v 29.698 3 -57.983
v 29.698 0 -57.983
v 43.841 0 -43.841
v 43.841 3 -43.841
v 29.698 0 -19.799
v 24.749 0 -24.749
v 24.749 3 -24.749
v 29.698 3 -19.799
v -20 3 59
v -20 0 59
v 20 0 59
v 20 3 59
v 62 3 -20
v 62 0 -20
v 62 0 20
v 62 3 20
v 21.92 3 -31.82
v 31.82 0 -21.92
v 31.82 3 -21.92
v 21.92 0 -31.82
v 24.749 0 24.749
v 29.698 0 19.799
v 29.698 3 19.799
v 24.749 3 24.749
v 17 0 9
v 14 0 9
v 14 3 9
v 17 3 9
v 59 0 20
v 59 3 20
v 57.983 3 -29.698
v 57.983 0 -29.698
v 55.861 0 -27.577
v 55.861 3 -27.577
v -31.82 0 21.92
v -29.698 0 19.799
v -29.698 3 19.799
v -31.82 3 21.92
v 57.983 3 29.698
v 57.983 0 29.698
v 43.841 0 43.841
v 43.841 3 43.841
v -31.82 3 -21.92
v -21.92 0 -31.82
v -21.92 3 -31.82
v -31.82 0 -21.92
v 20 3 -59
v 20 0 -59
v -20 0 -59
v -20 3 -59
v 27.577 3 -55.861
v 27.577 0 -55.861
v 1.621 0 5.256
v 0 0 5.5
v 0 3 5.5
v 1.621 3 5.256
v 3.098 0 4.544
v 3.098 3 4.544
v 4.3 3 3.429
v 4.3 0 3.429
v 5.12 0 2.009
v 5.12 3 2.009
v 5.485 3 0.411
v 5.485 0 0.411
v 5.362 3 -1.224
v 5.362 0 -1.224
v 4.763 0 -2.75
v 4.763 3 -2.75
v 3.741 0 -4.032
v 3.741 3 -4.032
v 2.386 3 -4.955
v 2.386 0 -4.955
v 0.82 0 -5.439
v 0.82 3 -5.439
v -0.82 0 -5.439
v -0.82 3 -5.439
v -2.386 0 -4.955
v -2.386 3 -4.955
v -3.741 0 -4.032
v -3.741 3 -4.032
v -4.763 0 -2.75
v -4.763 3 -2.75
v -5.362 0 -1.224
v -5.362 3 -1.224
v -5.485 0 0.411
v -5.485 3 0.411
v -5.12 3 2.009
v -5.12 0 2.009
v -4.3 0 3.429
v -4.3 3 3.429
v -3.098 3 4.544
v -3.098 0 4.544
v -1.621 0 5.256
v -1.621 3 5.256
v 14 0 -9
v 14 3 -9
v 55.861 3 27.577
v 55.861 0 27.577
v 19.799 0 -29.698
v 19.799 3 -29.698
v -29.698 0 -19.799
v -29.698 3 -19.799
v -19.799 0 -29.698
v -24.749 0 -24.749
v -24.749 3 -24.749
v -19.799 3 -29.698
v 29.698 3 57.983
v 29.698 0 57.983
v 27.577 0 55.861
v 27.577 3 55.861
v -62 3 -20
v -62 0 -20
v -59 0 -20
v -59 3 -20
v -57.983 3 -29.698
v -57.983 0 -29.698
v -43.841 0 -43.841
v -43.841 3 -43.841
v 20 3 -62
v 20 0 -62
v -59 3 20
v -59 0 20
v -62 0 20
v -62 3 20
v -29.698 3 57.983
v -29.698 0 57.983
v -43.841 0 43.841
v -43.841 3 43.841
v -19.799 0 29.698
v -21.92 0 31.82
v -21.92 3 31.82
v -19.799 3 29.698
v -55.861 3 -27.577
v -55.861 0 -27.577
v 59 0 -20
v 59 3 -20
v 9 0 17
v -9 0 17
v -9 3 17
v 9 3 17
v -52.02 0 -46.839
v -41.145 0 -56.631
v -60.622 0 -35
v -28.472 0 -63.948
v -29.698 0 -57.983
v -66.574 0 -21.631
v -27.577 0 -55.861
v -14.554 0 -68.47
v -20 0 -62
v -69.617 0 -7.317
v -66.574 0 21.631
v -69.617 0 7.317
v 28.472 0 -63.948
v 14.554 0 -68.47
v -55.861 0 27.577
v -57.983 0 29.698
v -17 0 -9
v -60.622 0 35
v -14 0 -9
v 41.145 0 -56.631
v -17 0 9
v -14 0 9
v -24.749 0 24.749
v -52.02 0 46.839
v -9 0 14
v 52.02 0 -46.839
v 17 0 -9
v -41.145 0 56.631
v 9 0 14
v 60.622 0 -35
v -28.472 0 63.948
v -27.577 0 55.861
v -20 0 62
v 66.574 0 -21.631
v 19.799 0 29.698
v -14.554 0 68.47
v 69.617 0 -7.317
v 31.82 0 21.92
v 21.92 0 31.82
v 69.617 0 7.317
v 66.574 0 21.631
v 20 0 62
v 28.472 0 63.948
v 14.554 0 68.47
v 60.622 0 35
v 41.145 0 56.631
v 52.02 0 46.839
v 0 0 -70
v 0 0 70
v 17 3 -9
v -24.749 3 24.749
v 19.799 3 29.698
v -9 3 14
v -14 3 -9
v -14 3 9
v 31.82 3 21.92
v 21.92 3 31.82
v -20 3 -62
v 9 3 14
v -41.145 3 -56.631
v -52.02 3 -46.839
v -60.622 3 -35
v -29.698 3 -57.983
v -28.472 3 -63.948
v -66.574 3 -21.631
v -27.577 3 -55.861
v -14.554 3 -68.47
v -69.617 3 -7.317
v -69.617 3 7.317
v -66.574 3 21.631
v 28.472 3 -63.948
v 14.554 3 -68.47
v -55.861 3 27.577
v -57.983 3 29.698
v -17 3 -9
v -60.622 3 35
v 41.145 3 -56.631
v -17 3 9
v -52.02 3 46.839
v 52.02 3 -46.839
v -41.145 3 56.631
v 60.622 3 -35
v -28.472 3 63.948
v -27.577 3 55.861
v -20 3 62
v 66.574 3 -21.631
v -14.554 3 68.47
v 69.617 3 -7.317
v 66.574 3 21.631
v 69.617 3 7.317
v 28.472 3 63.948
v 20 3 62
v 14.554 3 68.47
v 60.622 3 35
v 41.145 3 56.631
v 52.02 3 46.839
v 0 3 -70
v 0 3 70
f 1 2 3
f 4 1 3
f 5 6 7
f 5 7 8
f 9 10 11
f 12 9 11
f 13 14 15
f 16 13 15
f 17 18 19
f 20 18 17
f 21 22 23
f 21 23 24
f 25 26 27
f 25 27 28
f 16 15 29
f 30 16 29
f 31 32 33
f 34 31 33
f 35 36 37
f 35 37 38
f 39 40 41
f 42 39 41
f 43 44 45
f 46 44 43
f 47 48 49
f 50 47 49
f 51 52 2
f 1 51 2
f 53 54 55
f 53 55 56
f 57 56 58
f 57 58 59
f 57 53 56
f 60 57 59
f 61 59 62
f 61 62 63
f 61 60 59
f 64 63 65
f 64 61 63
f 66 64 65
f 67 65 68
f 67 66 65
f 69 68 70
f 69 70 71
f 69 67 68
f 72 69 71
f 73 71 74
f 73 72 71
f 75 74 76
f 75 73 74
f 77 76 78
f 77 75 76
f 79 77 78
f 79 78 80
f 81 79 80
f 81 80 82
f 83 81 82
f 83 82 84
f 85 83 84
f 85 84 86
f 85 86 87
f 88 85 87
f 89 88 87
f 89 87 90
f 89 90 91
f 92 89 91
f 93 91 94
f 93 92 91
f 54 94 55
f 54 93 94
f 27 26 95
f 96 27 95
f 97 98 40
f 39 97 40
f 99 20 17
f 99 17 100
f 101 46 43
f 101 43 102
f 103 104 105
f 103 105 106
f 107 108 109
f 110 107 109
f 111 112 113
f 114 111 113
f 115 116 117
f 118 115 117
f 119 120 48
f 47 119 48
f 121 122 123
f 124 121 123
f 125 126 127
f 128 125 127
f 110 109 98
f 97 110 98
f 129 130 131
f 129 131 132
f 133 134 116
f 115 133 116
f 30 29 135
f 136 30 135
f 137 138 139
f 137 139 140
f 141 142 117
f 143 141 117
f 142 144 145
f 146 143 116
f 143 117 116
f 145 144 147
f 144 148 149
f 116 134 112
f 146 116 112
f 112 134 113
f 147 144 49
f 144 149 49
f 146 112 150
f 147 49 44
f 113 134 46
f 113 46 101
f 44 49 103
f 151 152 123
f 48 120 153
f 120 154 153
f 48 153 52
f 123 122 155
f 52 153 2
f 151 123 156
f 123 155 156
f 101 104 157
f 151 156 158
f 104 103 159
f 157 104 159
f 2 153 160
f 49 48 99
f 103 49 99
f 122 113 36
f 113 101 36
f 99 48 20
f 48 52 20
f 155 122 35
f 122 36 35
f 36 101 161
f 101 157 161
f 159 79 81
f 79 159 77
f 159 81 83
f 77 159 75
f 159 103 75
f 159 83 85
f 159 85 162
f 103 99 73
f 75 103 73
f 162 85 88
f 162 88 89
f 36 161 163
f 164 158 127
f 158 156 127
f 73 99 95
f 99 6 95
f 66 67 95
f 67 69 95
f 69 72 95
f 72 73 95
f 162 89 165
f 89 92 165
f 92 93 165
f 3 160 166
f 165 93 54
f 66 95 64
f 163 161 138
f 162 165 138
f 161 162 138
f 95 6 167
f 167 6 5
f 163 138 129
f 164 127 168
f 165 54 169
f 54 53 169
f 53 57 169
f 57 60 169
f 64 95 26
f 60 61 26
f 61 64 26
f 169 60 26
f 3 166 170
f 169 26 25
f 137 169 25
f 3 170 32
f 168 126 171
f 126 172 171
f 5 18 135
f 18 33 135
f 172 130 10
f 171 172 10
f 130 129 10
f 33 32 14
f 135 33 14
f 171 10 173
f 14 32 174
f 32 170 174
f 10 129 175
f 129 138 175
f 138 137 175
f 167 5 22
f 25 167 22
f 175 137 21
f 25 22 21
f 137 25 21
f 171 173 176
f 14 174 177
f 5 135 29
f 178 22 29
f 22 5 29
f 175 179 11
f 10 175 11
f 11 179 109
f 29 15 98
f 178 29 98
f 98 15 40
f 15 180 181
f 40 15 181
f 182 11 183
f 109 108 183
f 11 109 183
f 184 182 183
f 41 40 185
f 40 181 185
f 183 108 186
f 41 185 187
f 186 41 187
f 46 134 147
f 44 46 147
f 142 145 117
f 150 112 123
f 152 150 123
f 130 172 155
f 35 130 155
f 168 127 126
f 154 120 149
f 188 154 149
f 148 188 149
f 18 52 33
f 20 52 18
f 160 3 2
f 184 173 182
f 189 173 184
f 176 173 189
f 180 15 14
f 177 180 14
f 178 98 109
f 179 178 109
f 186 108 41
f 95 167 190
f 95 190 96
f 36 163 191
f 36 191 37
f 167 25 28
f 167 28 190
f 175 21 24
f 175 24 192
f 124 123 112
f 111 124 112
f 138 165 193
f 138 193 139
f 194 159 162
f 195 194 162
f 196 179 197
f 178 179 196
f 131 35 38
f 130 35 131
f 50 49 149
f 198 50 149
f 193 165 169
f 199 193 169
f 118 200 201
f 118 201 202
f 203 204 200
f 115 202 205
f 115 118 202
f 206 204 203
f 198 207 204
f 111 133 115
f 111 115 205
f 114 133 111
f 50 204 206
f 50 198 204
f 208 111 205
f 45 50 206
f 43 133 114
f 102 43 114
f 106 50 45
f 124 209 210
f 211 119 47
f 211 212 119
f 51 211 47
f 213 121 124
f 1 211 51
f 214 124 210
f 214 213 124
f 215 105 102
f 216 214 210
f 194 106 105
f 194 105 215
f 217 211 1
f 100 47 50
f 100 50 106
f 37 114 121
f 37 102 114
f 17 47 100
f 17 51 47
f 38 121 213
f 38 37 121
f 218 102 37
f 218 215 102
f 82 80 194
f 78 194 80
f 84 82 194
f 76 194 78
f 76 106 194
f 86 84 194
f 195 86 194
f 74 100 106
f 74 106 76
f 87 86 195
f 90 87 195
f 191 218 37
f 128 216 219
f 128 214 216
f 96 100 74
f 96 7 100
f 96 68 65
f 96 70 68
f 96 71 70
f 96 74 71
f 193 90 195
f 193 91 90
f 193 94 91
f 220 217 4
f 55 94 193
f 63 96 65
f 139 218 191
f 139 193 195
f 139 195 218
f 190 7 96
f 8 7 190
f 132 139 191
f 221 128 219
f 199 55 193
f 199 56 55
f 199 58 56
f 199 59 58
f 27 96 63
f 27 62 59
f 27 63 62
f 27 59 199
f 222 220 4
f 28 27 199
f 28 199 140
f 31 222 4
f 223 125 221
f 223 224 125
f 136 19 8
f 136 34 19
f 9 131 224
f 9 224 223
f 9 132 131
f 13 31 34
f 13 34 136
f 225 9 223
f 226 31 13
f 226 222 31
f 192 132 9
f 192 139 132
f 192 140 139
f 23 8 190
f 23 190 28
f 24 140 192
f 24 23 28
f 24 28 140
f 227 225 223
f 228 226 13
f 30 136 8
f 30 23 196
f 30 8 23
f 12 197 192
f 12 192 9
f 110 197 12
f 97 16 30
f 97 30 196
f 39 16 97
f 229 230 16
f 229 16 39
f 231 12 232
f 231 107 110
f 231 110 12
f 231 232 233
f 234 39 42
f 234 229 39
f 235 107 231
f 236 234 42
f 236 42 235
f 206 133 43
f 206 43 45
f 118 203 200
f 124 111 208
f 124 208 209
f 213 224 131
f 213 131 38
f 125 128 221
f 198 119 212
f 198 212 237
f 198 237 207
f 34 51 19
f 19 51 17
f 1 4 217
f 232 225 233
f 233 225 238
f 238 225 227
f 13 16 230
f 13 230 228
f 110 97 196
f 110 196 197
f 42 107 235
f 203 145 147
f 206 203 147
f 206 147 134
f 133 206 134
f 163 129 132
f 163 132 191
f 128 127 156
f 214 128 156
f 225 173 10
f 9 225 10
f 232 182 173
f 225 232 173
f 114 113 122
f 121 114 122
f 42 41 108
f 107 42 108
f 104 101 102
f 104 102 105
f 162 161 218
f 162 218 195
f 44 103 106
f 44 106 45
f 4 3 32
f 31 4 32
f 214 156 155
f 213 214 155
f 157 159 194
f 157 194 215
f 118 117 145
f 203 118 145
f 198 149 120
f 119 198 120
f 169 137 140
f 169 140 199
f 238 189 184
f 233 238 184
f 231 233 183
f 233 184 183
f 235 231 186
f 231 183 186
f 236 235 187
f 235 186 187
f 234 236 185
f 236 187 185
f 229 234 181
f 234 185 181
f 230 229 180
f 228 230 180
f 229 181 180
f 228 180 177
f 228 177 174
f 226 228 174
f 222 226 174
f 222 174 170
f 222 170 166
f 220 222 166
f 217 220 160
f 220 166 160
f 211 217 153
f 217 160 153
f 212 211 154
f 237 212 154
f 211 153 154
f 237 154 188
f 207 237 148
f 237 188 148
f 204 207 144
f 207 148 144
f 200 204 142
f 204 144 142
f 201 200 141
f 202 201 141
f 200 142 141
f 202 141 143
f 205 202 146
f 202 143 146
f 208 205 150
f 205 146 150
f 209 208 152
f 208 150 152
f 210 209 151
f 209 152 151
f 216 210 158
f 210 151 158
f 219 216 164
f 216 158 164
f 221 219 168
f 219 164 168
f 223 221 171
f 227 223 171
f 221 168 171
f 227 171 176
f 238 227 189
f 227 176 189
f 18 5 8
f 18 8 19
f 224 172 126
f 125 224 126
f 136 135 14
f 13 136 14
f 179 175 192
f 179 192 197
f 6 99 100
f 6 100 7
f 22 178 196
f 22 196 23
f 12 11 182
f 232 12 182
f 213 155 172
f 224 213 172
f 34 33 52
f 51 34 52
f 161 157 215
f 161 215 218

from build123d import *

# Parameters (mm, degrees)
CROQUIS1_R              = 70
CROQUIS1_R_2            = 5.5
SALIENTE_EXTRUIR1_DEPTH = 3


with BuildPart() as part:
    # Croquis1 → Saliente-Extruir1 (new body)
    with BuildSketch(Plane(origin=(0, 0, 0), x_dir=(1, 0, 0), z_dir=(0, 1, 0))):
        with Locations(Location((0, 0, 0), (0, 0, 270))):
            Circle(CROQUIS1_R)
        with Locations(Location((0, 0, 0), (0, 0, 270))):
            Circle(CROQUIS1_R_2, mode=Mode.SUBTRACT)
        Polygon((24.748737342, 24.748737342), (29.69848481, 19.798989873), (31.819805153, 21.920310217), (21.920310217, 31.819805153), (19.798989873, 29.69848481), align=None, mode=Mode.SUBTRACT)
        Polygon((24.748737342, -24.748737342), (19.798989873, -29.69848481), (21.920310217, -31.819805153), (31.819805153, -21.920310217), (29.69848481, -19.798989873), align=None, mode=Mode.SUBTRACT)
        Polygon((-24.748737342, 24.748737342), (-19.798989873, 29.69848481), (-21.920310217, 31.819805153), (-31.819805153, 21.920310217), (-29.69848481, 19.798989873), align=None, mode=Mode.SUBTRACT)
        Polygon((-24.748737342, -24.748737342), (-29.69848481, -19.798989873), (-31.819805153, -21.920310217), (-21.920310217, -31.819805153), (-19.798989873, -29.69848481), align=None, mode=Mode.SUBTRACT)
        Polygon((-14, 0), (-14, 9), (-17, 9), (-17, -9), (-14, -9), align=None, mode=Mode.SUBTRACT)
        Polygon((14, 0), (14, -9), (17, -9), (17, 9), (14, 9), align=None, mode=Mode.SUBTRACT)
        Polygon((0, -14), (-9, -14), (-9, -17), (9, -17), (9, -14), align=None, mode=Mode.SUBTRACT)
        Polygon((0, 62), (20, 62), (20, 59), (-20, 59), (-20, 62), align=None, mode=Mode.SUBTRACT)
        Polygon((55.861435714, 27.577164466), (27.577164466, 55.861435714), (29.69848481, 57.982756057), (43.840620434, 43.840620434), (57.982756057, 29.69848481), align=None, mode=Mode.SUBTRACT)
        Polygon((59, -20), (59, 20), (62, 20), (62, 0), (62, -20), align=None, mode=Mode.SUBTRACT)
        Polygon((27.577164466, -55.861435714), (55.861435714, -27.577164466), (57.982756057, -29.69848481), (43.840620434, -43.840620434), (29.69848481, -57.982756057), align=None, mode=Mode.SUBTRACT)
        Polygon((-20, -59), (20, -59), (20, -62), (0, -62), (-20, -62), align=None, mode=Mode.SUBTRACT)
        Polygon((-55.861435714, -27.577164466), (-27.577164466, -55.861435714), (-29.69848481, -57.982756057), (-43.840620434, -43.840620434), (-57.982756057, -29.69848481), align=None, mode=Mode.SUBTRACT)
        Polygon((-59, 20), (-59, -20), (-62, -20), (-62, 0), (-62, 20), align=None, mode=Mode.SUBTRACT)
        Polygon((-27.577164466, 55.861435714), (-55.861435714, 27.577164466), (-57.982756057, 29.69848481), (-43.840620434, 43.840620434), (-29.69848481, 57.982756057), align=None, mode=Mode.SUBTRACT)
    extrude(amount=SALIENTE_EXTRUIR1_DEPTH)


solid = part.part
